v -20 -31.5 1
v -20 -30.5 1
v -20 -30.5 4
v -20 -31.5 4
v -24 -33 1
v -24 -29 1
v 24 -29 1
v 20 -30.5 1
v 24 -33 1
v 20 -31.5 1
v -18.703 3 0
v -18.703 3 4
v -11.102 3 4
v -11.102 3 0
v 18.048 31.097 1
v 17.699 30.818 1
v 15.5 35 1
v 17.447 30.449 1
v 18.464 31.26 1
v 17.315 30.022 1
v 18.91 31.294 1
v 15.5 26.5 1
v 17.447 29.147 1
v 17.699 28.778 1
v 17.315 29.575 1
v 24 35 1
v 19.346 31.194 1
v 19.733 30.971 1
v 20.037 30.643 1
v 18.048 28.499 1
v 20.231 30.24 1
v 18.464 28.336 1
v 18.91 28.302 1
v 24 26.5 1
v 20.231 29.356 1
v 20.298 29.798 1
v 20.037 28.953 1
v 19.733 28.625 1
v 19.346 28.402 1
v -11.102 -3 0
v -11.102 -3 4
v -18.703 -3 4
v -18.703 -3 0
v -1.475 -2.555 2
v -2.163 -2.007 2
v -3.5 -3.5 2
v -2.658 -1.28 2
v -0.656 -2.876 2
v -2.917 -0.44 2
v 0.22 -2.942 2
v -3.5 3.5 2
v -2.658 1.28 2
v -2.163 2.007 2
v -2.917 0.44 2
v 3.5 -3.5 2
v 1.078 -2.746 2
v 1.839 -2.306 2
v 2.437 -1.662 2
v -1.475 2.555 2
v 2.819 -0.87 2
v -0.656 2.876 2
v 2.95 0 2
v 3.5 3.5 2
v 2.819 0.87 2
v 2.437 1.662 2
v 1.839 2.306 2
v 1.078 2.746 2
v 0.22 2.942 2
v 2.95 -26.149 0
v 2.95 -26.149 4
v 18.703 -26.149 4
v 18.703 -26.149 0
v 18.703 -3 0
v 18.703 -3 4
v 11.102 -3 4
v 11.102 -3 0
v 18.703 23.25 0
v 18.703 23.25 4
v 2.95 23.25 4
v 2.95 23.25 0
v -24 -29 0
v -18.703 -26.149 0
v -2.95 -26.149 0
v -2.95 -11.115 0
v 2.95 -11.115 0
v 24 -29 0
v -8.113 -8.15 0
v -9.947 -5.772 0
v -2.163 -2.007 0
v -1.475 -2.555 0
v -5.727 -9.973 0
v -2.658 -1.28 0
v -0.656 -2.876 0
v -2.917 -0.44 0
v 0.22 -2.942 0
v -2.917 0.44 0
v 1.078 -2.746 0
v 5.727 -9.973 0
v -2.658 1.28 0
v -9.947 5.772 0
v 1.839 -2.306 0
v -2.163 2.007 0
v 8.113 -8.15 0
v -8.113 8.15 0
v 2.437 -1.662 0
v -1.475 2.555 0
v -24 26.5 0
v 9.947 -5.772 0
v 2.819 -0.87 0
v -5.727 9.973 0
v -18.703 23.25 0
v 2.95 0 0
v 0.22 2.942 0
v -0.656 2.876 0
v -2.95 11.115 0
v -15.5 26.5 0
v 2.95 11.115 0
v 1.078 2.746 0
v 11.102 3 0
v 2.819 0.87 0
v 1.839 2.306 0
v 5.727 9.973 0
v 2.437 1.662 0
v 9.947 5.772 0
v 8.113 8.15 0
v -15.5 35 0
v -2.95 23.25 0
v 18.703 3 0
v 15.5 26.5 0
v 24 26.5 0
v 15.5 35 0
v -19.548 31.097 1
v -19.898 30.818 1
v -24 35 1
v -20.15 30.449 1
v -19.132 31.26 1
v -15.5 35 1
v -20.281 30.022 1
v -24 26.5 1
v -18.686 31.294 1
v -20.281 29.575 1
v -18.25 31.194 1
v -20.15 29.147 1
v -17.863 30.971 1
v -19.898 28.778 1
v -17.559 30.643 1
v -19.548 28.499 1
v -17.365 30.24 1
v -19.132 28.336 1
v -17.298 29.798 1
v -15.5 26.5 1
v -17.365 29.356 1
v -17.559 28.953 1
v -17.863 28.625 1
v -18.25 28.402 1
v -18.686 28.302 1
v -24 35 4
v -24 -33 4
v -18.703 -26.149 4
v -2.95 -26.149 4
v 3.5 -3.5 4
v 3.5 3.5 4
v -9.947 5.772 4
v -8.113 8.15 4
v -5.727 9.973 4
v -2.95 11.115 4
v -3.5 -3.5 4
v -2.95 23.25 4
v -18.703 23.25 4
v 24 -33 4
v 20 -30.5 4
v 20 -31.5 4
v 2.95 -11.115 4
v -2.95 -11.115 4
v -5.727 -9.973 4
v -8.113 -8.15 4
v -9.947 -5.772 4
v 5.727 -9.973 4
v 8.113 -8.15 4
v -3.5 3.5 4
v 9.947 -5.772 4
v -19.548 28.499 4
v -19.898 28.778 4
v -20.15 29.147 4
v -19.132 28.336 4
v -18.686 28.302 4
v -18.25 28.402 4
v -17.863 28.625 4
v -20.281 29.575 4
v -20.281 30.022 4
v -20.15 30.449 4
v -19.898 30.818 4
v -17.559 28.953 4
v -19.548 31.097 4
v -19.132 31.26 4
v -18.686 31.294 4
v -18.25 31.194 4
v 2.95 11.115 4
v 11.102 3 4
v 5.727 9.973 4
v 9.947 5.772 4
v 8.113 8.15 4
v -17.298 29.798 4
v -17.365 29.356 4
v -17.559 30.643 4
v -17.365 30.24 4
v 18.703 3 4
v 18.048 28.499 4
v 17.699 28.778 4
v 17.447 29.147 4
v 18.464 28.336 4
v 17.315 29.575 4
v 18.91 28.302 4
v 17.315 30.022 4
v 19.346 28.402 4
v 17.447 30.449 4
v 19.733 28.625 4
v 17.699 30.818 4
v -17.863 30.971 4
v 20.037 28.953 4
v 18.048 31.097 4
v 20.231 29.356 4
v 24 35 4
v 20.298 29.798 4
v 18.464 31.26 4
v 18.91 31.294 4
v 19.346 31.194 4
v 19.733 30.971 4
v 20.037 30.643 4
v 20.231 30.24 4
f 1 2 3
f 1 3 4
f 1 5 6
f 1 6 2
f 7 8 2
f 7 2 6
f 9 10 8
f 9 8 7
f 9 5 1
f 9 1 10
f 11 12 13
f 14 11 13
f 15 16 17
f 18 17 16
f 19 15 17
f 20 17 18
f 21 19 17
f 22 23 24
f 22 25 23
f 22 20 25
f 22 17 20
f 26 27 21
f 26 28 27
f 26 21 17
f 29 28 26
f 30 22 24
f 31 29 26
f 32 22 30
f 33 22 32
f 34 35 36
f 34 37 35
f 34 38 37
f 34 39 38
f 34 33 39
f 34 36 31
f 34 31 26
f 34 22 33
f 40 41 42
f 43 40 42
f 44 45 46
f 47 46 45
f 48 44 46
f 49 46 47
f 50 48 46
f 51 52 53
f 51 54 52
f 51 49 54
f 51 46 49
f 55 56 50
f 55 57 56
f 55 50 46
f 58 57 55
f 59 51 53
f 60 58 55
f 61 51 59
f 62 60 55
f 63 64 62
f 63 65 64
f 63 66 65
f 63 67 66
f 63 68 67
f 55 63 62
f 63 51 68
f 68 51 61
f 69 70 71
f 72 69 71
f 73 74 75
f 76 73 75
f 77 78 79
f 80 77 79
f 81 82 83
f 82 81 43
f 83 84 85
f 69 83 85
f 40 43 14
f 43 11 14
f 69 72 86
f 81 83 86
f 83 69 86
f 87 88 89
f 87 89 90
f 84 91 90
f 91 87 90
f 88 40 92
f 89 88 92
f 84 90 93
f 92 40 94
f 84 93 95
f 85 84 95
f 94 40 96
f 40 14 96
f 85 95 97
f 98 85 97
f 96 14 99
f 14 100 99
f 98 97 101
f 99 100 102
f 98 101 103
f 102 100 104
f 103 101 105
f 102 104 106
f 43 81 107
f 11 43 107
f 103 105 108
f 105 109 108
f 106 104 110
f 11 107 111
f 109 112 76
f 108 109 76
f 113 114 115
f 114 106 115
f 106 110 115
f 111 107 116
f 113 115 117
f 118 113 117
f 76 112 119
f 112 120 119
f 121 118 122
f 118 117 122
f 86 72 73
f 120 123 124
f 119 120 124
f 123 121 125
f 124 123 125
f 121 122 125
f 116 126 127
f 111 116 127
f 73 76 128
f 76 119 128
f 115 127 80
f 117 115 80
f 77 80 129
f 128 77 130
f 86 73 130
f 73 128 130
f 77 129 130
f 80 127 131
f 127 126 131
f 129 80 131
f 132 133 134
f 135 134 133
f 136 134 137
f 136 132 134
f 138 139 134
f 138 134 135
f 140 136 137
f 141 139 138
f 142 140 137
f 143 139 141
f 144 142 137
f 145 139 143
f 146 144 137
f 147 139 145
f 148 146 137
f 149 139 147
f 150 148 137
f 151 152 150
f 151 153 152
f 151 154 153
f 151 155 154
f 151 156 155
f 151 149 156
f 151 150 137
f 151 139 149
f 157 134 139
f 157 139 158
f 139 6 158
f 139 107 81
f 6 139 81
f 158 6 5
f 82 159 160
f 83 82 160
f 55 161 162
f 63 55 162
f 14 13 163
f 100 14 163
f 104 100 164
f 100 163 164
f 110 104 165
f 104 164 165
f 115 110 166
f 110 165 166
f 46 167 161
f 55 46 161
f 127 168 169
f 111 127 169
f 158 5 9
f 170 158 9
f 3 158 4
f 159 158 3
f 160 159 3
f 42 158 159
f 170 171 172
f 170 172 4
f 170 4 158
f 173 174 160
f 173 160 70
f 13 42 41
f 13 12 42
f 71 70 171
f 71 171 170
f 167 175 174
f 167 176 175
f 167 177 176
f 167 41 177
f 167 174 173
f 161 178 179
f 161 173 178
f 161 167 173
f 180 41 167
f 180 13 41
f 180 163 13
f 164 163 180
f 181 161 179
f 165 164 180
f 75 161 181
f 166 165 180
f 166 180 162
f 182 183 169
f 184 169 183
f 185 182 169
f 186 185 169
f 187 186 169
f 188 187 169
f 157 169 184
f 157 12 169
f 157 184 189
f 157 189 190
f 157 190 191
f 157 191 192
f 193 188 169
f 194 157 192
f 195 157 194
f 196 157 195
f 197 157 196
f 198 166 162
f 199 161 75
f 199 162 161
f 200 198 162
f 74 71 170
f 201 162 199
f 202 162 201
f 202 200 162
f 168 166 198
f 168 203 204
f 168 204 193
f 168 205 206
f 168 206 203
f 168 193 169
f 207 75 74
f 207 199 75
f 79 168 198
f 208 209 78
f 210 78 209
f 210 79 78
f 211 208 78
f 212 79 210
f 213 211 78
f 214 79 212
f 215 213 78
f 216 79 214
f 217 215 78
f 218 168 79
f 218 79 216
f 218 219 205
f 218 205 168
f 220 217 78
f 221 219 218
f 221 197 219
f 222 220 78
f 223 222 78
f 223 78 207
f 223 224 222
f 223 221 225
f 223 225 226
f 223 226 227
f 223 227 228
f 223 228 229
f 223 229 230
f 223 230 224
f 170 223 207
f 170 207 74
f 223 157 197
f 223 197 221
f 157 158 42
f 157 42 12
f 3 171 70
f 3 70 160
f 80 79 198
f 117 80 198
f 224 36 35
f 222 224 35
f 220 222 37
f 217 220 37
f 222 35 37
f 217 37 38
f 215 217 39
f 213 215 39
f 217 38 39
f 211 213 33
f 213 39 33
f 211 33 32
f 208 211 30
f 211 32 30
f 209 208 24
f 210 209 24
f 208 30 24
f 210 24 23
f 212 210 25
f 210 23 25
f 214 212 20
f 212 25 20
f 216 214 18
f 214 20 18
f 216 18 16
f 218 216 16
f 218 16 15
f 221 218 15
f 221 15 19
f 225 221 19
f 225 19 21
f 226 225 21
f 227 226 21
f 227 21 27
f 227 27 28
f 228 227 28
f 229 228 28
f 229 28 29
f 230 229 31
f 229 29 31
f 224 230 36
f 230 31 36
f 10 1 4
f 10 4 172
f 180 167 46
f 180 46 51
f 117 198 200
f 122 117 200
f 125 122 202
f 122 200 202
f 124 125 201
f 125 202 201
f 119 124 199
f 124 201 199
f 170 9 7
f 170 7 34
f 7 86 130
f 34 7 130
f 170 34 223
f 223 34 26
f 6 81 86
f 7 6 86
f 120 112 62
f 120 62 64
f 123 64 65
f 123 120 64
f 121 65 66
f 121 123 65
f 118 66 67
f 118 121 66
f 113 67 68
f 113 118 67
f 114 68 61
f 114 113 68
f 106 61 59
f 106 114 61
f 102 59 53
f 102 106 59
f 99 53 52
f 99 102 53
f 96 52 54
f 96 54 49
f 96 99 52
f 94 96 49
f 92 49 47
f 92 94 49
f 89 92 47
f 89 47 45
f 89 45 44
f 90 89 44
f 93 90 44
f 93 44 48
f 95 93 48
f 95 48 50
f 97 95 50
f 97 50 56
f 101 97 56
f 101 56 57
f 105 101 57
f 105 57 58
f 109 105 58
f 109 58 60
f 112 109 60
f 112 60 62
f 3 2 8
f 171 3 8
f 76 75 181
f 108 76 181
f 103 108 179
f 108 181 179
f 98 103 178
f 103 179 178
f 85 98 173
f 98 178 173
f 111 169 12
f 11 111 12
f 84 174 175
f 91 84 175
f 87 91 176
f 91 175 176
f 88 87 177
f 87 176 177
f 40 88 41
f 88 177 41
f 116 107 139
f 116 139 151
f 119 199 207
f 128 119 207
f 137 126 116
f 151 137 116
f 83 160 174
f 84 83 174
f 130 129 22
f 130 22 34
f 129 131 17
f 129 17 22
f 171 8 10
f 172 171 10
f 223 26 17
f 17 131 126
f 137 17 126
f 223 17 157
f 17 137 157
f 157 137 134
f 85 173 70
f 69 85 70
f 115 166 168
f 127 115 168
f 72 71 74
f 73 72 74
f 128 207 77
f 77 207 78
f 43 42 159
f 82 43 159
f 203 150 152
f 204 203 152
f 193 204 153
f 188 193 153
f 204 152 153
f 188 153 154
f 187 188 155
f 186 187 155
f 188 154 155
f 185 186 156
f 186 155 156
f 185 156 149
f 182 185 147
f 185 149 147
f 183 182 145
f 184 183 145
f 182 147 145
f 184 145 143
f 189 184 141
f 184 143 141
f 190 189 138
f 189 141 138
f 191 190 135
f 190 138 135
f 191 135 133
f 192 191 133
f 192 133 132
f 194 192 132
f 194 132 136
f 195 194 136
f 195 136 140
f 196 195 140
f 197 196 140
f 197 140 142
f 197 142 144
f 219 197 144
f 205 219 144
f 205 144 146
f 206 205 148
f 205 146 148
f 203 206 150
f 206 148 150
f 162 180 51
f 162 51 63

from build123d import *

# Parameters (mm, degrees)
F0_R      = 2.95
F1_DEPTH  = 4
F2_W      = 8.5
F2_H      = 8.5
F3_DEPTH  = 1
F4_R      = 1.5
F5_DEPTH  = 3
F7_DEPTH  = 4
F8_R      = 1.5
F9_DEPTH  = 3
F10_W     = 48
F10_H     = 4
F11_DEPTH = 1
F12_W     = 40
F12_H     = 1
F13_DEPTH = 3
F14_W     = 7
F14_H     = 7
F14_R     = 2.95
F15_DEPTH = 2


# Not quite as in the source:
# - a feature names something its author has since deleted; it is built from what else it names


with BuildPart() as f1:
    # F0 (on Top) → F1 (new body)
    with BuildSketch(Plane.XY):
        Polygon((-24, -33), (24, -33), (24, 26.5), (24, 35), (17.5, 35), (-17.5, 35), (-24, 35), (-24, 26.5), align=None)
        Circle(F0_R, mode=Mode.SUBTRACT)
    extrude(amount=F1_DEPTH)

    # F2 (on face) → F3 (cut)
    with BuildSketch(Plane(origin=(0, 0, 0), x_dir=(1, 0, 0), z_dir=(0, 0, -1))):
        with Locations((19.75, -30.75)):
            Rectangle(F2_W, F2_H)
        with Locations((-19.75, -30.75)):
            Rectangle(F2_W, F2_H)
    extrude(amount=-F3_DEPTH, mode=Mode.SUBTRACT)

    # F4 (on face) → F5 (cut)
    with BuildSketch(Plane(origin=(0, 0, 1), x_dir=(1, 0, 0), z_dir=(0, 0, -1))):
        with Locations((18.7980970389, -29.7980970389)):
            Circle(F4_R)
    extrude(amount=-F5_DEPTH, mode=Mode.SUBTRACT)

    # F6 (on face) → F7 (cut)
    with BuildSketch(Plane.XY.offset(4)):
        with BuildLine():
            Line((-18.7027541446, 3), (-11.1018016556, 3))
            ThreePointArc((-11.1018016556, 3), (-8.1134067433, 8.1500080379), (-2.95, 11.115192306))
            Line((-2.95, 11.115192306), (-2.95, 23.25))
            Line((-2.95, 23.25), (-18.7027541446, 23.25))
            Line((-18.7027541446, 23.25), (-18.7027541446, 3))
        make_face()
        with BuildLine():
            Line((2.95, 23.25), (2.95, 11.115192306))
            ThreePointArc((2.95, 11.115192306), (8.1134067433, 8.1500080379), (11.1018016556, 3))
            Line((11.1018016556, 3), (18.7027541446, 3))
            Line((18.7027541446, 3), (18.7027541446, 23.25))
            Line((18.7027541446, 23.25), (2.95, 23.25))
        make_face()
        with BuildLine():
            Line((-18.7027541446, -9.125), (-18.7027541446, -16.125))
            Line((-18.7027541446, -16.125), (-18.7027541446, -26.1487078986))
            Line((-18.7027541446, -26.1487078986), (-10, -26.1487078986))
            Line((-10, -26.1487078986), (-2.95, -26.1487078986))
            Line((-2.95, -26.1487078986), (-2.95, -11.115192306))
            ThreePointArc((-2.95, -11.115192306), (-8.1134067433, -8.1500080379), (-11.1018016556, -3))
            Line((-11.1018016556, -3), (-17.7254807204, -3))
            Line((-17.7254807204, -3), (-18.7027541446, -3))
            Line((-18.7027541446, -3), (-18.7027541446, -9.125))
        make_face()
        with BuildLine():
            ThreePointArc((11.1018016556, -3), (8.1134067433, -8.1500080379), (2.95, -11.115192306))
            Line((2.95, -11.115192306), (2.95, -26.1487078986))
            Line((2.95, -26.1487078986), (10, -26.1487078986))
            Line((10, -26.1487078986), (18.7027541446, -26.1487078986))
            Line((18.7027541446, -26.1487078986), (18.7027541446, -16.125))
            Line((18.7027541446, -16.125), (18.7027541446, -9.125))
            Line((18.7027541446, -9.125), (18.7027541446, -3.9093415253))
            Line((18.7027541446, -3.9093415253), (18.7027541446, -3))
            Line((18.7027541446, -3), (11.1018016556, -3))
        make_face()
    extrude(amount=-F7_DEPTH, mode=Mode.SUBTRACT)

    # F8 (on face) → F9 (cut)
    with BuildSketch(Plane(origin=(0, 0, 1), x_dir=(1, 0, 0), z_dir=(0, 0, -1))):
        with Locations((-18.7980970389, -29.7980970389)):
            Circle(F8_R)
    extrude(amount=-F9_DEPTH, mode=Mode.SUBTRACT)

    # F10 (on face) → F11 (cut)
    with BuildSketch(Plane(origin=(0, 0, 0), x_dir=(1, 0, 0), z_dir=(0, 0, -1))):
        with Locations((0, 31)):
            Rectangle(F10_W, F10_H)
    extrude(amount=-F11_DEPTH, mode=Mode.SUBTRACT)

    # F12 (on face) → F13 (cut)
    with BuildSketch(Plane(origin=(0, 0, 1), x_dir=(1, 0, 0), z_dir=(0, 0, -1))):
        with Locations((0, 31)):
            Rectangle(F12_W, F12_H)
    extrude(amount=-F13_DEPTH, mode=Mode.SUBTRACT)

    # F14 (on face) → F15 (cut)
    with BuildSketch(Plane.XY.offset(4)):
        Rectangle(F14_W, F14_H)
        Circle(F14_R, mode=Mode.SUBTRACT)
    extrude(amount=-F15_DEPTH, mode=Mode.SUBTRACT)


solid = f1.part
